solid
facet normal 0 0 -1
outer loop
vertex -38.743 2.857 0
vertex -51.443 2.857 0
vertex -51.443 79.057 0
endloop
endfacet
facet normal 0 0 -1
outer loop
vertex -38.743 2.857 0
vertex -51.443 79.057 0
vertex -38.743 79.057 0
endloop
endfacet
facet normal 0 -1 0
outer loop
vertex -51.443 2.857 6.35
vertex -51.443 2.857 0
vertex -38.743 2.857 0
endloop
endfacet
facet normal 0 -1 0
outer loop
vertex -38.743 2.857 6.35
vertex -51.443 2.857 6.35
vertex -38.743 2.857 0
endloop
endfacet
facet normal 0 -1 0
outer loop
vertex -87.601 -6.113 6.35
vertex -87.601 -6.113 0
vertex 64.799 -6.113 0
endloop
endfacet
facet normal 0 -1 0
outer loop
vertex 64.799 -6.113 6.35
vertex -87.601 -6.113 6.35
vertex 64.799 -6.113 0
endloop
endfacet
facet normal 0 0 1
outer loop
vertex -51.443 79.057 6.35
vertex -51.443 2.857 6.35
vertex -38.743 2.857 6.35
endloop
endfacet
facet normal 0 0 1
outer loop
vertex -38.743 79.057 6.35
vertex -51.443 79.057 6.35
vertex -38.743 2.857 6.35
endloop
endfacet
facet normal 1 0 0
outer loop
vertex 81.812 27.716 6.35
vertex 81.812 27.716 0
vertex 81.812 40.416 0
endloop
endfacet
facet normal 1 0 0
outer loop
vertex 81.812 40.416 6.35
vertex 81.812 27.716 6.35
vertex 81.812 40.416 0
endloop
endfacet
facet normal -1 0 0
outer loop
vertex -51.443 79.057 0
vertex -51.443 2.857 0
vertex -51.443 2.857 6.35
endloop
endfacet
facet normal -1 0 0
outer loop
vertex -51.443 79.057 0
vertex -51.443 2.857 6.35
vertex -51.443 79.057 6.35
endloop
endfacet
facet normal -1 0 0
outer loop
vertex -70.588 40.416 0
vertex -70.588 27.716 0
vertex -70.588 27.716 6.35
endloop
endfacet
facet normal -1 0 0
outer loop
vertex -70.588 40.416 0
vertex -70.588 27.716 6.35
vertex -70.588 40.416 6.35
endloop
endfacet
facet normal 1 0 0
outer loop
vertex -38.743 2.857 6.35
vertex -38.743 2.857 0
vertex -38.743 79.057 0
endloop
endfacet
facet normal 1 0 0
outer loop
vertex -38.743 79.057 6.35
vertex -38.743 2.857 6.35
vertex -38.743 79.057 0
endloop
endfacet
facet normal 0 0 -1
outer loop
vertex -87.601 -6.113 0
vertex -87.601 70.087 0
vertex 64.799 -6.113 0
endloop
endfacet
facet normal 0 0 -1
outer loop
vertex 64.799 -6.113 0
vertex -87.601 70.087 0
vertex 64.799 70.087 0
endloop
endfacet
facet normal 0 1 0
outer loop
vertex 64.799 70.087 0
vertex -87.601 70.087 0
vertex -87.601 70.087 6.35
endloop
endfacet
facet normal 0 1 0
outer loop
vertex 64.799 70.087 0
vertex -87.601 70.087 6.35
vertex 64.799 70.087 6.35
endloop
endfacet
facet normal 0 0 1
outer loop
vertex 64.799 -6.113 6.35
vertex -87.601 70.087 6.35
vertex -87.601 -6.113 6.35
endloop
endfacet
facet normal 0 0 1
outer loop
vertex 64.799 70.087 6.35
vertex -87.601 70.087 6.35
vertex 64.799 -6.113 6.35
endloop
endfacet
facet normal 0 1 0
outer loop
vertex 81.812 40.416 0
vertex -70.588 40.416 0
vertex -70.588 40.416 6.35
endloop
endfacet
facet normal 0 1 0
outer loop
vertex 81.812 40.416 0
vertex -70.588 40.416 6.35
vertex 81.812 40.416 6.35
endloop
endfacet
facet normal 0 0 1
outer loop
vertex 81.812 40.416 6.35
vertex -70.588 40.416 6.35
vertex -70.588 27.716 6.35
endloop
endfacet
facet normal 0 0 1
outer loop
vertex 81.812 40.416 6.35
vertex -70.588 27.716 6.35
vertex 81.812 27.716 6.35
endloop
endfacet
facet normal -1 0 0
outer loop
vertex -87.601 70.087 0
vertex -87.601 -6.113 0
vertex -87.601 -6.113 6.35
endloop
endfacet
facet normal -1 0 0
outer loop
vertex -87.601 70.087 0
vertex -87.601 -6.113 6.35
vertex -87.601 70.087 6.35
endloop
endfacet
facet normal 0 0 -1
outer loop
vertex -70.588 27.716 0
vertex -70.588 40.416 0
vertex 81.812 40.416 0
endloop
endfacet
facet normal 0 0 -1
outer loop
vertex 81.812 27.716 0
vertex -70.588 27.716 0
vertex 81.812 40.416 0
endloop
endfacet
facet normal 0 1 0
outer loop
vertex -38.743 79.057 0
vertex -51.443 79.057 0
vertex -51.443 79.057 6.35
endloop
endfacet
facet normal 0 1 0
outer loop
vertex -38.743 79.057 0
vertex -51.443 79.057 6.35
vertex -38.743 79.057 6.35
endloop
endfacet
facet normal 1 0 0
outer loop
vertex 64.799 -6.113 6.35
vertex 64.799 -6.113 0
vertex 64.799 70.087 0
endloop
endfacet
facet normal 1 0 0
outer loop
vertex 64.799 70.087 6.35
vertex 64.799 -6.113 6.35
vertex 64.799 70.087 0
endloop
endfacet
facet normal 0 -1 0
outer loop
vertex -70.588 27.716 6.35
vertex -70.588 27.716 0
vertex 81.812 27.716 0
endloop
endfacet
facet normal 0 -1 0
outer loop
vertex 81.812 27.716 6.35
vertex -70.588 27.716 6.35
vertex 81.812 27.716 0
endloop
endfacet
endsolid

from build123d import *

# Parameters (mm, degrees)
F0_W     = 152.4
F0_H     = 76.2
F1_DEPTH = 6.35
F2_W     = 152.4
F2_H     = 12.7
F3_DEPTH = 6.35
F4_W     = 12.7
F4_H     = 76.2
F5_DEPTH = 6.35


with BuildPart() as f1:
    # F0 (on Top) → F1 (new body)
    with BuildSketch(Plane.XY):
        with Locations((-11.401173, 31.987291)):
            Rectangle(F0_W, F0_H)
    extrude(amount=F1_DEPTH)


with BuildPart() as f3:
    # F2 (on Top) → F3 (new body)
    with BuildSketch(Plane.XY):
        with Locations((5.611584, 34.065676)):
            Rectangle(F2_W, F2_H)
    extrude(amount=F3_DEPTH)


with BuildPart() as f5:
    # F4 (on Top) → F5 (new body)
    with BuildSketch(Plane.XY):
        with Locations((-45.093002, 40.956691)):
            Rectangle(F4_W, F4_H)
    extrude(amount=F5_DEPTH)


solid = Compound([f1.part, f3.part, f5.part])
